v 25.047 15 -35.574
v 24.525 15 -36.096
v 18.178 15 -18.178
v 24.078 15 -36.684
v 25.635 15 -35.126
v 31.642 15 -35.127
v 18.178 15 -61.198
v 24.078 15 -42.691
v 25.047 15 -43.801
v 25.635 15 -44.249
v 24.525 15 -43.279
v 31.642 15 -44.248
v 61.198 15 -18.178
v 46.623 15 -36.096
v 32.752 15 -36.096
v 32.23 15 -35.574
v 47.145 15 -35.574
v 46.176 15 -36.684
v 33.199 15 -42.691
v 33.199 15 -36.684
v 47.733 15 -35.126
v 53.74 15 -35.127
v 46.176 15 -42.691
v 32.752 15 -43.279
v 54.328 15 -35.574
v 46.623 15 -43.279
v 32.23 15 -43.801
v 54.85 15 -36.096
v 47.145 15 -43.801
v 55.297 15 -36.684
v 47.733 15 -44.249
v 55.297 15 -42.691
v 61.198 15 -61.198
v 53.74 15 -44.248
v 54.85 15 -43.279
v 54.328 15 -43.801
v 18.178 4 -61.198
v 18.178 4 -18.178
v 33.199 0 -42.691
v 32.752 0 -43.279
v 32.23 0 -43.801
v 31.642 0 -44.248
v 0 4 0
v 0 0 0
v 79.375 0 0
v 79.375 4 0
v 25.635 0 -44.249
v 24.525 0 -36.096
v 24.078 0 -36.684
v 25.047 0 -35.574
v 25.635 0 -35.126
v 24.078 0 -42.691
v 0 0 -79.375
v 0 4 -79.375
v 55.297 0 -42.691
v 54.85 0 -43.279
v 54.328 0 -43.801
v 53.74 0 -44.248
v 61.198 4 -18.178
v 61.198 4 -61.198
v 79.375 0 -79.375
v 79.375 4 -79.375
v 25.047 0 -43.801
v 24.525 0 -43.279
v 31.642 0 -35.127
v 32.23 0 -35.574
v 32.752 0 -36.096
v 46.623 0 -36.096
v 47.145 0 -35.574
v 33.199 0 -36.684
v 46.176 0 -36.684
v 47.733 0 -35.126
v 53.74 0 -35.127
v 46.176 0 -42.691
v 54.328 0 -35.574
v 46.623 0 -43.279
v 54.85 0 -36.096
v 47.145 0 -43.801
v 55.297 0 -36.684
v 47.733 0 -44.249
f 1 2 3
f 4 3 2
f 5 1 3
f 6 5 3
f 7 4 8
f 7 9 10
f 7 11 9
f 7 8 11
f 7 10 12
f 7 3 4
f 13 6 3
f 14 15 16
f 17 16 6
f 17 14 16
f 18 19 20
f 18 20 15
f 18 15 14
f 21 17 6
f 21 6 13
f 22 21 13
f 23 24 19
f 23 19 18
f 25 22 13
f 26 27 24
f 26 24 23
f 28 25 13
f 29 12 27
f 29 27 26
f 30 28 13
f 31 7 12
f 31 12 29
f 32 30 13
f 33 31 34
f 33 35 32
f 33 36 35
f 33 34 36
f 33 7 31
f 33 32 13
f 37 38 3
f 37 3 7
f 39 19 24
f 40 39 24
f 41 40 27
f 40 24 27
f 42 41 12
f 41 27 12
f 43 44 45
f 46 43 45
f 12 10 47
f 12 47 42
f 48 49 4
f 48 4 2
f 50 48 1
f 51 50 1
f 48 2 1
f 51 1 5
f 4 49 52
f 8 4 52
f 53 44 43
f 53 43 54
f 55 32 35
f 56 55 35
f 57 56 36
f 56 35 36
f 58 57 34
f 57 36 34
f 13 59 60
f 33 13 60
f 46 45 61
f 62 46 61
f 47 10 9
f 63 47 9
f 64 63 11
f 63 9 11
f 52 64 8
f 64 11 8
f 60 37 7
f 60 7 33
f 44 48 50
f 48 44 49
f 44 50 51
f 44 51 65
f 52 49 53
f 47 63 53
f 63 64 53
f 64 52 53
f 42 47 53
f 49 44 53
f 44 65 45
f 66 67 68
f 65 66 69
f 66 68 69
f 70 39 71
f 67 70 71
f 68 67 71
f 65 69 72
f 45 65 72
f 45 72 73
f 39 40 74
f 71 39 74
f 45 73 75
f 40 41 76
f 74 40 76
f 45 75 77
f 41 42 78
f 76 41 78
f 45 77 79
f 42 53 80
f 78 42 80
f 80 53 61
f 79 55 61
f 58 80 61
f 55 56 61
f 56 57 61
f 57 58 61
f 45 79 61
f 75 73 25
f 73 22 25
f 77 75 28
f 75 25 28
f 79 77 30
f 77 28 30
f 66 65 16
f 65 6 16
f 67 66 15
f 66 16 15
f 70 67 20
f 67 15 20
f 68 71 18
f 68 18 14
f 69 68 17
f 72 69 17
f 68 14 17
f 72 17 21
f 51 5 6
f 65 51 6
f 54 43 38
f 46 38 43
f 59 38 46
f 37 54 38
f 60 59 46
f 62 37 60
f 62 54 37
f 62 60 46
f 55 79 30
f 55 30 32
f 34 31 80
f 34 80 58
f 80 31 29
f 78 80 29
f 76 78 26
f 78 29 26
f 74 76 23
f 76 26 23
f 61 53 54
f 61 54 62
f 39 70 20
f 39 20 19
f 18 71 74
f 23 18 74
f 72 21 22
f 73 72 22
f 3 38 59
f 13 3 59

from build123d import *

# Parameters (mm, degrees)
SKETCH1_W               = 79.375
SKETCH1_H               = 79.375
BOSS_EXTRUDE1_DEPTH     = 4
SKETCH2_W               = 43.02
SKETCH2_H               = 43.02
SKETCH2_R               = 5.461
BOSS_EXTRUDE2_DEPTH     = 11
SKETCH3_R               = 5.461
CUT_EXTRUDE1_DEPTH      = 1
CUT_EXTRUDE1_DEPTH_BACK = 16
SKETCH4_W               = 38.805624494
SKETCH4_H               = 17.902161279
SKETCH4_W_2             = 9.122
SKETCH4_H_2             = 9.122
BOSS_EXTRUDE3_DEPTH     = 15


with BuildPart() as part:
    # Sketch1 → Boss-Extrude1 (new body)
    with BuildSketch(Plane(origin=(0, 0, 0), x_dir=(1, 0, 0), z_dir=(0, 1, 0))):
        with Locations((39.6875, 39.6875)):
            Rectangle(SKETCH1_W, SKETCH1_H)
    extrude(amount=BOSS_EXTRUDE1_DEPTH)

    # Sketch2 → Boss-Extrude2 (add)
    with BuildSketch(Plane(origin=(0, 4, 0), x_dir=(1, 0, 0), z_dir=(0, 1, 0))):
        with Locations((39.6875, 39.6875)):
            Rectangle(SKETCH2_W, SKETCH2_H)
        with Locations((28.6385, 39.6875)):
            Circle(SKETCH2_R, mode=Mode.SUBTRACT)
        with Locations((50.7365, 39.6875)):
            Circle(SKETCH2_R, mode=Mode.SUBTRACT)
    extrude(amount=BOSS_EXTRUDE2_DEPTH)

    # Sketch3 → Cut-Extrude1 (cut, two sides)
    with BuildSketch(Plane(origin=(0, 15, 0), x_dir=(1, 0, 0), z_dir=(0, 1, 0))) as cut_extrude1_sk:
        with Locations((28.6385, 39.6875)):
            Circle(SKETCH3_R)
        with Locations((50.7365, 39.6875)):
            Circle(SKETCH3_R)
    extrude(amount=CUT_EXTRUDE1_DEPTH, mode=Mode.SUBTRACT)
    extrude(cut_extrude1_sk.sketch, amount=-CUT_EXTRUDE1_DEPTH_BACK, mode=Mode.SUBTRACT)

    # Sketch4 → Boss-Extrude3 (add)
    with BuildSketch(Plane(origin=(0, 15, 0), x_dir=(1, 0, 0), z_dir=(0, 1, 0))):
        with Locations((39.727968959, 38.830978853)):
            Rectangle(SKETCH4_W, SKETCH4_H)
        with Locations((28.6385, 39.6875)):
            Rectangle(SKETCH4_W_2, SKETCH4_H_2, mode=Mode.SUBTRACT)
        with Locations((50.7365, 39.6875)):
            Rectangle(SKETCH4_W_2, SKETCH4_H_2, mode=Mode.SUBTRACT)
    extrude(amount=-BOSS_EXTRUDE3_DEPTH)


solid = part.part
